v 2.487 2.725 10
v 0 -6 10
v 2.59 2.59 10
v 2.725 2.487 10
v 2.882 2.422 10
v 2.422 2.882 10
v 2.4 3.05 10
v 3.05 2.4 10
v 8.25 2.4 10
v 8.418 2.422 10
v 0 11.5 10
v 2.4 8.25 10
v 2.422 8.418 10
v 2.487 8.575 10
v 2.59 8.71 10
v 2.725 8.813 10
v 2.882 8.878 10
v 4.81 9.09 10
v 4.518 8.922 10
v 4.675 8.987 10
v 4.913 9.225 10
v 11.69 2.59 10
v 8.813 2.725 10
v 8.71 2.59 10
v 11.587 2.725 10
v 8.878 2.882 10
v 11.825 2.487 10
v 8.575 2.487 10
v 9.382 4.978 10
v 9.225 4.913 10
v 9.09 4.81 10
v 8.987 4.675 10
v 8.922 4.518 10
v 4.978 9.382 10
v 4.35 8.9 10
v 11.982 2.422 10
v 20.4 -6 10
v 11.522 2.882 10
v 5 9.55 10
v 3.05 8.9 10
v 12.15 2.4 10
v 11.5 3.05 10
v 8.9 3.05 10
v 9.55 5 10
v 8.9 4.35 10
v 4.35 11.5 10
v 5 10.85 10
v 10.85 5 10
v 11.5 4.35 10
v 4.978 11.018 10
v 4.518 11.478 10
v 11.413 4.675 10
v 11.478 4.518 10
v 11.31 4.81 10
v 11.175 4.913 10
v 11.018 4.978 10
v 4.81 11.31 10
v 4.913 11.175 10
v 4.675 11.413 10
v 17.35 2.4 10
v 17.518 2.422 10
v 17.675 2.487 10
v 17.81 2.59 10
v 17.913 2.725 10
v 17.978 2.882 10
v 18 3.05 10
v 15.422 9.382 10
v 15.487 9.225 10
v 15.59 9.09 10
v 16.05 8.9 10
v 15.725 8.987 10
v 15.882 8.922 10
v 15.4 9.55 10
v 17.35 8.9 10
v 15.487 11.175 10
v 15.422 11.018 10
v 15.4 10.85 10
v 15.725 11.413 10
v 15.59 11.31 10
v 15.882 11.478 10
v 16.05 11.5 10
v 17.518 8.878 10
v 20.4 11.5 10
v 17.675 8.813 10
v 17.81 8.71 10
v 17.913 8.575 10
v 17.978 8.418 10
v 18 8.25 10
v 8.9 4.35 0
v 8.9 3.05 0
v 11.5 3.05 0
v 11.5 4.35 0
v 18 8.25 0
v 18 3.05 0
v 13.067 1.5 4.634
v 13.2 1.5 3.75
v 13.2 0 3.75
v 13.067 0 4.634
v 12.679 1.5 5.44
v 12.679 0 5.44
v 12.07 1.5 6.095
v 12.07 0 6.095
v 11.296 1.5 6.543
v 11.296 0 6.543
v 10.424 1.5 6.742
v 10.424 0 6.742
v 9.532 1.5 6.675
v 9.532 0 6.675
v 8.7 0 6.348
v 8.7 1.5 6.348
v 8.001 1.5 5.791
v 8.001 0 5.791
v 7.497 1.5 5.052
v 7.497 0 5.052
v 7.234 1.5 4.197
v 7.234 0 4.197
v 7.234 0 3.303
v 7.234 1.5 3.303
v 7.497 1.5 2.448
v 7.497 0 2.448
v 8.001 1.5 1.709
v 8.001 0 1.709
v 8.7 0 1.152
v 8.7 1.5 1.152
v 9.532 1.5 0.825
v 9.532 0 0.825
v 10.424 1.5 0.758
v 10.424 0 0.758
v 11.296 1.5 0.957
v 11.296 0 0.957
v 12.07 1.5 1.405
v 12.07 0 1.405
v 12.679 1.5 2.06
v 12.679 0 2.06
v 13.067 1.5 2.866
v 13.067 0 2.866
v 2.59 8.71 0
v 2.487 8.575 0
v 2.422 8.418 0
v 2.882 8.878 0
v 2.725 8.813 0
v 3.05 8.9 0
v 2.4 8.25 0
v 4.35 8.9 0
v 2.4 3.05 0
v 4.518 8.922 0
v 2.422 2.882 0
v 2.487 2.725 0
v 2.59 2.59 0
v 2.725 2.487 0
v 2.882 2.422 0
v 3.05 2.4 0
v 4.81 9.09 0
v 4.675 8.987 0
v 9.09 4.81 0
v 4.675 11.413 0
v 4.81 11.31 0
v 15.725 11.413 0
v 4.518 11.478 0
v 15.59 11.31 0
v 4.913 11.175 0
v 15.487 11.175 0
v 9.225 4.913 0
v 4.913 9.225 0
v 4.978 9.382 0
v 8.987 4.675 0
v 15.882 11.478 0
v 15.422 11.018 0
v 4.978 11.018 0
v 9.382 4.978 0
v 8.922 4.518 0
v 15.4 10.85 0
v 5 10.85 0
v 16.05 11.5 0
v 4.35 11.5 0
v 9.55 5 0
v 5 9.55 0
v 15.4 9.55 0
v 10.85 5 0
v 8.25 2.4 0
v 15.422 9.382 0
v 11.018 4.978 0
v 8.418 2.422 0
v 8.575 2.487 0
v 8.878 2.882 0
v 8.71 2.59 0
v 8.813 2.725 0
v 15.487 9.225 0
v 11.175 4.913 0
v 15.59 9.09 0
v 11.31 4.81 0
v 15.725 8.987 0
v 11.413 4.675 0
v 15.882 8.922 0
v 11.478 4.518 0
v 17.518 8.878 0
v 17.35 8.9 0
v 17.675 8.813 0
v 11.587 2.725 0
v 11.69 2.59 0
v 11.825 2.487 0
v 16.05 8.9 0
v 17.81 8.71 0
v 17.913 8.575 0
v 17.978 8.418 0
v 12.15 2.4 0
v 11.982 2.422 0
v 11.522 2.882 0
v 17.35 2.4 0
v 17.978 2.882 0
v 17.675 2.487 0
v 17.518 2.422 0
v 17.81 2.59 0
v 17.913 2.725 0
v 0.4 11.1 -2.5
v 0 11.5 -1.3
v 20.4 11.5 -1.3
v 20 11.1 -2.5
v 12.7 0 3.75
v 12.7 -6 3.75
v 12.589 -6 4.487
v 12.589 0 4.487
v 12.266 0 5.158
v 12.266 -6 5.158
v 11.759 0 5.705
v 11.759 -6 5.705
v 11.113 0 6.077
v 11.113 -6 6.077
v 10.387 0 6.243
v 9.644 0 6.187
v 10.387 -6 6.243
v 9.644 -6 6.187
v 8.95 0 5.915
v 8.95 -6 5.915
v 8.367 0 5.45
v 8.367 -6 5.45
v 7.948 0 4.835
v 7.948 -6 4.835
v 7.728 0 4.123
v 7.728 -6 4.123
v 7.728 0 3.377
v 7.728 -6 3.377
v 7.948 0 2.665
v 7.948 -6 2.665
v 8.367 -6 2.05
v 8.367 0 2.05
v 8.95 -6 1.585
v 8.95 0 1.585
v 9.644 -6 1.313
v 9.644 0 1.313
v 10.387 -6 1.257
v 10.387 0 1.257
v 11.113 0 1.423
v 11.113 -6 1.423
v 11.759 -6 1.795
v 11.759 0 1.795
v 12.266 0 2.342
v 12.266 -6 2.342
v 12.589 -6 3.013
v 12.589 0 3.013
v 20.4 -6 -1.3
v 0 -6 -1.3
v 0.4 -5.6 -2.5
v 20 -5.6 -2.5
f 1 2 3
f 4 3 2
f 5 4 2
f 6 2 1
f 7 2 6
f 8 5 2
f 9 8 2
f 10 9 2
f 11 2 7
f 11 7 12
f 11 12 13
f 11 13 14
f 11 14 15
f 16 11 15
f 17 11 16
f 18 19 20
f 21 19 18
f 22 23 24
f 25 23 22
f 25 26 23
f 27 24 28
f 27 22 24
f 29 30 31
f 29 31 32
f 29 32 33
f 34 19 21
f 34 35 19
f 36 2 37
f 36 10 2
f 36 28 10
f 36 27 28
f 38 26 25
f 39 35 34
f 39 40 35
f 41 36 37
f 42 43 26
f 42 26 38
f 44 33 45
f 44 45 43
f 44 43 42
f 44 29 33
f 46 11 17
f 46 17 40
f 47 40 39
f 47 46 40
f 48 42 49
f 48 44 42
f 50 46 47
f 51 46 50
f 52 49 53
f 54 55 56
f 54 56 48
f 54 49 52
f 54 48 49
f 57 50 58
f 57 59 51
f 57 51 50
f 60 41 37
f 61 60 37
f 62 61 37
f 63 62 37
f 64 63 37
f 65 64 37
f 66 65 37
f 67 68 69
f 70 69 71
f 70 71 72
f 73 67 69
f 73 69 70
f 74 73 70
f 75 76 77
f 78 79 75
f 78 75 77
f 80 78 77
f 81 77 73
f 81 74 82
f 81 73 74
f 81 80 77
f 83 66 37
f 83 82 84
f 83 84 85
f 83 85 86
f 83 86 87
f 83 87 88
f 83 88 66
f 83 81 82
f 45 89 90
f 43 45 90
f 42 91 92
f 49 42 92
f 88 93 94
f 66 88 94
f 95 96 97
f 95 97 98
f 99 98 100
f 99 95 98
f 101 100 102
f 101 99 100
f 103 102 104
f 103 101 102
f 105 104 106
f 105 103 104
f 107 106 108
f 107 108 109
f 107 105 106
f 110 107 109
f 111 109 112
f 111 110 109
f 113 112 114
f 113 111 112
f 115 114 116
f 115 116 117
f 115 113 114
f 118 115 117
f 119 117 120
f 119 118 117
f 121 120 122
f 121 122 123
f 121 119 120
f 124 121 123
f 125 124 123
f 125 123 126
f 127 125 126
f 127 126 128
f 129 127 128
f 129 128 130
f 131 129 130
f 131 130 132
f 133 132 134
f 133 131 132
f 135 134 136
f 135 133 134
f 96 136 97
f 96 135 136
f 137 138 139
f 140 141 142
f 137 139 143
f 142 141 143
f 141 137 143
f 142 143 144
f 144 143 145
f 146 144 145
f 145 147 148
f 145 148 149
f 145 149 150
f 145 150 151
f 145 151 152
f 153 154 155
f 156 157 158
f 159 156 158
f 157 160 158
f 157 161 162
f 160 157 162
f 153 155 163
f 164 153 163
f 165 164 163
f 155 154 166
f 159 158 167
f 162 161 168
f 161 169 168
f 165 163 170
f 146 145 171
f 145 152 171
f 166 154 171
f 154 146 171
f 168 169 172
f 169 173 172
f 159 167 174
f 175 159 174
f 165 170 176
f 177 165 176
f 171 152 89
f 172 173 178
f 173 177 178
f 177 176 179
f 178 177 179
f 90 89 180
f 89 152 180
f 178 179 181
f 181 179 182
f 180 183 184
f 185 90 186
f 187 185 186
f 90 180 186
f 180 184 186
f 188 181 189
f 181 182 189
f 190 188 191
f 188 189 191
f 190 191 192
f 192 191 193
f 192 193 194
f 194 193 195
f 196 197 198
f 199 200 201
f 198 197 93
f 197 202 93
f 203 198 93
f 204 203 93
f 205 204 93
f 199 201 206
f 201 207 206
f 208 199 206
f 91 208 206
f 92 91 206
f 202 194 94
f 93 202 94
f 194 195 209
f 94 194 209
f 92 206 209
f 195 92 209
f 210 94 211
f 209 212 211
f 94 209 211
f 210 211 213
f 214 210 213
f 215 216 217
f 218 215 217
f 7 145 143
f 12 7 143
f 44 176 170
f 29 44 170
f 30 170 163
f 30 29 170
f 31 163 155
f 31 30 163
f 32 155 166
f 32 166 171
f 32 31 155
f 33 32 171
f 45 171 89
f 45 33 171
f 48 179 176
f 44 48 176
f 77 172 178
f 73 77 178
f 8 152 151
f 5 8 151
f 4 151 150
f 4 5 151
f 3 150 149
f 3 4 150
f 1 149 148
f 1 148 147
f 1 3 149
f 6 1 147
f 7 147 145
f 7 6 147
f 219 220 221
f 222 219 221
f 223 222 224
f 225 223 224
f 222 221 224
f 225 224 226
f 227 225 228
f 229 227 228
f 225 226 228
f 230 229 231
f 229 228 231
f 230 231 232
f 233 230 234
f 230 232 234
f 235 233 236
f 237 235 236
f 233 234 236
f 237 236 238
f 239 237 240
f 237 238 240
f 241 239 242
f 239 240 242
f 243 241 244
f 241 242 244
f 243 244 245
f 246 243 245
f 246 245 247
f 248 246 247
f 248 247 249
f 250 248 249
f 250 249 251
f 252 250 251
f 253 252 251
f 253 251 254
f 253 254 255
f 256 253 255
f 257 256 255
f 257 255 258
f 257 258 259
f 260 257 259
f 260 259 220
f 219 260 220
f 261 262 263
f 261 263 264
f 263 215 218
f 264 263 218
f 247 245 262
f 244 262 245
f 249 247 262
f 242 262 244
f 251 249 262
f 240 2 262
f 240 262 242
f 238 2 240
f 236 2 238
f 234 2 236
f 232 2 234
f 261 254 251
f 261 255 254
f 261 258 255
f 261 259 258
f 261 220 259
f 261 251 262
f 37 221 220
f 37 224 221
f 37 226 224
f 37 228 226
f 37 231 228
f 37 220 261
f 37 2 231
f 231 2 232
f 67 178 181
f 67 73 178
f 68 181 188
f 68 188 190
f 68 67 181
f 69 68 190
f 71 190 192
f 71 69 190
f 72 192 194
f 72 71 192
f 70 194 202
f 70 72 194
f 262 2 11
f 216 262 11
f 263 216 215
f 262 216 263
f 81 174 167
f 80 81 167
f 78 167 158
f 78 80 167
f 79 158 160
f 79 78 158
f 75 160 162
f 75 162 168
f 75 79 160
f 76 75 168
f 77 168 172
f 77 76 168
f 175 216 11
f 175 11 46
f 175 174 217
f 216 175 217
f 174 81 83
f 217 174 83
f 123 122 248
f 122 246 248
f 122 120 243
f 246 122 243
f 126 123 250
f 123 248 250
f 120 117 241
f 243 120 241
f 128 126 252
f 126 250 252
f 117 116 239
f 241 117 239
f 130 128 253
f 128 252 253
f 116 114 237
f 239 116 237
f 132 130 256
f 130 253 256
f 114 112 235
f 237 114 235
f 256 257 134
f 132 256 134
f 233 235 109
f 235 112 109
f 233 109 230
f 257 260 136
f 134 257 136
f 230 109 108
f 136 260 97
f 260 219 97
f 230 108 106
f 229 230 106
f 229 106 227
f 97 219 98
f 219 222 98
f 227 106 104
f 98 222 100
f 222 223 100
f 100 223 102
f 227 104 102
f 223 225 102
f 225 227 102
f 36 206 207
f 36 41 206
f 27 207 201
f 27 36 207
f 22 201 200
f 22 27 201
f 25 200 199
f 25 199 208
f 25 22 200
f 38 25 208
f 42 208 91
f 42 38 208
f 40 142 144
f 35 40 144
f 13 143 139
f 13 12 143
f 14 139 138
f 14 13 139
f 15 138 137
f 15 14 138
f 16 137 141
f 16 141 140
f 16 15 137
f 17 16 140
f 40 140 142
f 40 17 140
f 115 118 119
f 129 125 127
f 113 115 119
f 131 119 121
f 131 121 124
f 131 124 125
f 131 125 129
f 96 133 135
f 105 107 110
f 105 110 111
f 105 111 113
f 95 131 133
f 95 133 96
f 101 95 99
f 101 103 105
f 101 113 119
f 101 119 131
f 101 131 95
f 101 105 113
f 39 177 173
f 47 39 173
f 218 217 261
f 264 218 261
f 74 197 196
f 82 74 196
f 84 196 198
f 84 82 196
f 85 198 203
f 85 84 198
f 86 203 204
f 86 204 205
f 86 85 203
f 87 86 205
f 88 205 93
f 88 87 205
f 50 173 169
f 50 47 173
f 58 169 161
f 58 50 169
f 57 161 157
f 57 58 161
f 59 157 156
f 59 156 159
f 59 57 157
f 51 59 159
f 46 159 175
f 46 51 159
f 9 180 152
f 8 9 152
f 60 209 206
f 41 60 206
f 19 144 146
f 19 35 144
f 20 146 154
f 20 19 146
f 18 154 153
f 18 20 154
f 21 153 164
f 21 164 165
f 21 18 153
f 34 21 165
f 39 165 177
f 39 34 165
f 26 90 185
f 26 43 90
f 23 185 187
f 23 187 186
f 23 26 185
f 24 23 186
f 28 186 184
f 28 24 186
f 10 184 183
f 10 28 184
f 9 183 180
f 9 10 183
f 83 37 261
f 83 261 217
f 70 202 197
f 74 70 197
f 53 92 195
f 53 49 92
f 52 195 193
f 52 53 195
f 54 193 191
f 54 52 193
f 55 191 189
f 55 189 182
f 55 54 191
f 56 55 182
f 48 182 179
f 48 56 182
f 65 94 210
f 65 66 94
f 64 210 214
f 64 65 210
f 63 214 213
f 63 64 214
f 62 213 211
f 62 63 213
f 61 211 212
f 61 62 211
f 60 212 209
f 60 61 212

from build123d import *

# Parameters (mm, degrees)
F1_DEPTH  = 10
F2_R      = 0.65
F4_DEPTH  = 2.5
F5_W      = 20.4
F5_H      = 6
F6_DEPTH  = 10
F7_DEPTH  = 2.5
F8_R      = 2.5
F9_DEPTH  = 7.5
F10_R     = 3
F10_R_2   = 2.5
F11_DEPTH = 1.5
F12_SIZE2 = 1.2
F12_SIZE  = 0.4


with BuildPart() as f1:
    # F0 (on Top) → F1 (new body)
    with BuildSketch(Plane.XY):
        Polygon((0, 11.5), (0, 0), (20.4, 0), (20.4, 11.5), (15.4, 11.5), (15.4, 8.9), (18, 8.9), (18, 2.4), (11.5, 2.4), (11.5, 5), (8.9, 5), (8.9, 2.4), (2.4, 2.4), (2.4, 8.9), (5, 8.9), (5, 11.5), align=None)
    extrude(amount=F1_DEPTH)

    # F2
    f2_edges = [f1.edges().sort_by_distance(p)[0] for p in [
        (2.4, 8.9, 5),
        (2.4, 2.4, 5),
        (11.5, 2.4, 5),
        (8.9, 2.4, 5),
        (18, 2.4, 5),
        (18, 8.9, 5),
        (15.4, 8.9, 5),
        (15.4, 11.5, 5),
        (5, 8.9, 5),
        (5, 11.5, 5),
        (11.5, 5, 5),
        (8.9, 5, 5),
    ]]
    fillet(f2_edges, radius=F2_R)

    # F3 (on face) → F4 (join)
    with BuildSketch(Plane(origin=(0, 0, 0), x_dir=(1, 0, 0), z_dir=(0, 0, -1))):
        with BuildLine():
            ThreePointArc((5, -10.85), (4.8096194078, -11.3096194078), (4.35, -11.5))
            Line((4.35, -11.5), (16.05, -11.5))
            ThreePointArc((16.05, -11.5), (15.5903805922, -11.3096194078), (15.4, -10.85))
            Line((15.4, -10.85), (15.4, -9.55))
            ThreePointArc((15.4, -9.55), (15.5903805922, -9.0903805922), (16.05, -8.9))
            Line((16.05, -8.9), (17.35, -8.9))
            ThreePointArc((17.35, -8.9), (17.8096194078, -8.7096194078), (18, -8.25))
            Line((18, -8.25), (18, -3.05))
            ThreePointArc((18, -3.05), (17.8096194078, -2.5903805922), (17.35, -2.4))
            Line((17.35, -2.4), (12.15, -2.4))
            ThreePointArc((12.15, -2.4), (11.6903805922, -2.5903805922), (11.5, -3.05))
            Line((11.5, -3.05), (11.5, -4.35))
            ThreePointArc((11.5, -4.35), (11.3096194078, -4.8096194078), (10.85, -5))
            Line((10.85, -5), (9.55, -5))
            ThreePointArc((9.55, -5), (9.0903805922, -4.8096194078), (8.9, -4.35))
            Line((8.9, -4.35), (8.9, -3.05))
            ThreePointArc((8.9, -3.05), (8.7096194078, -2.5903805922), (8.25, -2.4))
            Line((8.25, -2.4), (3.05, -2.4))
            ThreePointArc((3.05, -2.4), (2.5903805922, -2.5903805922), (2.4, -3.05))
            Line((2.4, -3.05), (2.4, -8.25))
            ThreePointArc((2.4, -8.25), (2.5903805922, -8.7096194078), (3.05, -8.9))
            Line((3.05, -8.9), (4.35, -8.9))
            ThreePointArc((4.35, -8.9), (4.8096194078, -9.0903805922), (5, -9.55))
            Line((5, -9.55), (5, -10.85))
        make_face()
        with BuildLine():
            Line((20.4, 0), (0, 0))
            Line((0, 0), (0, -11.5))
            Line((0, -11.5), (4.35, -11.5))
            ThreePointArc((4.35, -11.5), (4.8096194078, -11.3096194078), (5, -10.85))
            Line((5, -10.85), (5, -9.55))
            ThreePointArc((5, -9.55), (4.8096194078, -9.0903805922), (4.35, -8.9))
            Line((4.35, -8.9), (3.05, -8.9))
            ThreePointArc((3.05, -8.9), (2.5903805922, -8.7096194078), (2.4, -8.25))
            Line((2.4, -8.25), (2.4, -3.05))
            ThreePointArc((2.4, -3.05), (2.5903805922, -2.5903805922), (3.05, -2.4))
            Line((3.05, -2.4), (8.25, -2.4))
            ThreePointArc((8.25, -2.4), (8.7096194078, -2.5903805922), (8.9, -3.05))
            Line((8.9, -3.05), (8.9, -4.35))
            ThreePointArc((8.9, -4.35), (9.0903805922, -4.8096194078), (9.55, -5))
            Line((9.55, -5), (10.85, -5))
            ThreePointArc((10.85, -5), (11.3096194078, -4.8096194078), (11.5, -4.35))
            Line((11.5, -4.35), (11.5, -3.05))
            ThreePointArc((11.5, -3.05), (11.6903805922, -2.5903805922), (12.15, -2.4))
            Line((12.15, -2.4), (17.35, -2.4))
            ThreePointArc((17.35, -2.4), (17.8096194078, -2.5903805922), (18, -3.05))
            Line((18, -3.05), (18, -8.25))
            ThreePointArc((18, -8.25), (17.8096194078, -8.7096194078), (17.35, -8.9))
            Line((17.35, -8.9), (16.05, -8.9))
            ThreePointArc((16.05, -8.9), (15.5903805922, -9.0903805922), (15.4, -9.55))
            Line((15.4, -9.55), (15.4, -10.85))
            ThreePointArc((15.4, -10.85), (15.5903805922, -11.3096194078), (16.05, -11.5))
            Line((16.05, -11.5), (20.4, -11.5))
            Line((20.4, -11.5), (20.4, 0))
        make_face()
    extrude(amount=F4_DEPTH)

    # F5 (on Top) → F6 (join, through all)
    with BuildSketch(Plane.XY):
        with Locations((10.2, -3)):
            Rectangle(F5_W, F5_H)
    extrude(amount=F6_DEPTH)

    # F7 (add, through all): a face of the model
    f7_faces = [f1.faces().sort_by_distance(p)[0] for p in [
        (10.2, -3, 0),
    ]]
    extrude(f7_faces, amount=F7_DEPTH)

    # F8 (on face) → F9 (cut)
    with BuildSketch(Plane.XZ.offset(6)):
        with Locations((10.2, 3.75)):
            Circle(F8_R)
    extrude(amount=-F9_DEPTH, mode=Mode.SUBTRACT)

    # F10 (on face) → F11 (cut)
    with BuildSketch(Plane.XZ.offset(-1.5)):
        with Locations((10.2, 3.75)):
            Circle(F10_R)
        with Locations((10.2, 3.75)):
            Circle(F10_R_2, mode=Mode.SUBTRACT)
    extrude(amount=F11_DEPTH, mode=Mode.SUBTRACT)

    # F12
    f12_edges = [f1.edges().sort_by_distance(p)[0] for p in [
        (20.4, 2.75, -2.5),
        (10.2, -6, -2.5),
        (0, 2.75, -2.5),
        (10.2, 11.5, -2.5),
    ]]
    f12_side = f1.faces().sort_by_distance((10.2, 2.75, -2.5))[0]
    chamfer(f12_edges, length=F12_SIZE, length2=F12_SIZE2, reference=f12_side)


solid = f1.part
